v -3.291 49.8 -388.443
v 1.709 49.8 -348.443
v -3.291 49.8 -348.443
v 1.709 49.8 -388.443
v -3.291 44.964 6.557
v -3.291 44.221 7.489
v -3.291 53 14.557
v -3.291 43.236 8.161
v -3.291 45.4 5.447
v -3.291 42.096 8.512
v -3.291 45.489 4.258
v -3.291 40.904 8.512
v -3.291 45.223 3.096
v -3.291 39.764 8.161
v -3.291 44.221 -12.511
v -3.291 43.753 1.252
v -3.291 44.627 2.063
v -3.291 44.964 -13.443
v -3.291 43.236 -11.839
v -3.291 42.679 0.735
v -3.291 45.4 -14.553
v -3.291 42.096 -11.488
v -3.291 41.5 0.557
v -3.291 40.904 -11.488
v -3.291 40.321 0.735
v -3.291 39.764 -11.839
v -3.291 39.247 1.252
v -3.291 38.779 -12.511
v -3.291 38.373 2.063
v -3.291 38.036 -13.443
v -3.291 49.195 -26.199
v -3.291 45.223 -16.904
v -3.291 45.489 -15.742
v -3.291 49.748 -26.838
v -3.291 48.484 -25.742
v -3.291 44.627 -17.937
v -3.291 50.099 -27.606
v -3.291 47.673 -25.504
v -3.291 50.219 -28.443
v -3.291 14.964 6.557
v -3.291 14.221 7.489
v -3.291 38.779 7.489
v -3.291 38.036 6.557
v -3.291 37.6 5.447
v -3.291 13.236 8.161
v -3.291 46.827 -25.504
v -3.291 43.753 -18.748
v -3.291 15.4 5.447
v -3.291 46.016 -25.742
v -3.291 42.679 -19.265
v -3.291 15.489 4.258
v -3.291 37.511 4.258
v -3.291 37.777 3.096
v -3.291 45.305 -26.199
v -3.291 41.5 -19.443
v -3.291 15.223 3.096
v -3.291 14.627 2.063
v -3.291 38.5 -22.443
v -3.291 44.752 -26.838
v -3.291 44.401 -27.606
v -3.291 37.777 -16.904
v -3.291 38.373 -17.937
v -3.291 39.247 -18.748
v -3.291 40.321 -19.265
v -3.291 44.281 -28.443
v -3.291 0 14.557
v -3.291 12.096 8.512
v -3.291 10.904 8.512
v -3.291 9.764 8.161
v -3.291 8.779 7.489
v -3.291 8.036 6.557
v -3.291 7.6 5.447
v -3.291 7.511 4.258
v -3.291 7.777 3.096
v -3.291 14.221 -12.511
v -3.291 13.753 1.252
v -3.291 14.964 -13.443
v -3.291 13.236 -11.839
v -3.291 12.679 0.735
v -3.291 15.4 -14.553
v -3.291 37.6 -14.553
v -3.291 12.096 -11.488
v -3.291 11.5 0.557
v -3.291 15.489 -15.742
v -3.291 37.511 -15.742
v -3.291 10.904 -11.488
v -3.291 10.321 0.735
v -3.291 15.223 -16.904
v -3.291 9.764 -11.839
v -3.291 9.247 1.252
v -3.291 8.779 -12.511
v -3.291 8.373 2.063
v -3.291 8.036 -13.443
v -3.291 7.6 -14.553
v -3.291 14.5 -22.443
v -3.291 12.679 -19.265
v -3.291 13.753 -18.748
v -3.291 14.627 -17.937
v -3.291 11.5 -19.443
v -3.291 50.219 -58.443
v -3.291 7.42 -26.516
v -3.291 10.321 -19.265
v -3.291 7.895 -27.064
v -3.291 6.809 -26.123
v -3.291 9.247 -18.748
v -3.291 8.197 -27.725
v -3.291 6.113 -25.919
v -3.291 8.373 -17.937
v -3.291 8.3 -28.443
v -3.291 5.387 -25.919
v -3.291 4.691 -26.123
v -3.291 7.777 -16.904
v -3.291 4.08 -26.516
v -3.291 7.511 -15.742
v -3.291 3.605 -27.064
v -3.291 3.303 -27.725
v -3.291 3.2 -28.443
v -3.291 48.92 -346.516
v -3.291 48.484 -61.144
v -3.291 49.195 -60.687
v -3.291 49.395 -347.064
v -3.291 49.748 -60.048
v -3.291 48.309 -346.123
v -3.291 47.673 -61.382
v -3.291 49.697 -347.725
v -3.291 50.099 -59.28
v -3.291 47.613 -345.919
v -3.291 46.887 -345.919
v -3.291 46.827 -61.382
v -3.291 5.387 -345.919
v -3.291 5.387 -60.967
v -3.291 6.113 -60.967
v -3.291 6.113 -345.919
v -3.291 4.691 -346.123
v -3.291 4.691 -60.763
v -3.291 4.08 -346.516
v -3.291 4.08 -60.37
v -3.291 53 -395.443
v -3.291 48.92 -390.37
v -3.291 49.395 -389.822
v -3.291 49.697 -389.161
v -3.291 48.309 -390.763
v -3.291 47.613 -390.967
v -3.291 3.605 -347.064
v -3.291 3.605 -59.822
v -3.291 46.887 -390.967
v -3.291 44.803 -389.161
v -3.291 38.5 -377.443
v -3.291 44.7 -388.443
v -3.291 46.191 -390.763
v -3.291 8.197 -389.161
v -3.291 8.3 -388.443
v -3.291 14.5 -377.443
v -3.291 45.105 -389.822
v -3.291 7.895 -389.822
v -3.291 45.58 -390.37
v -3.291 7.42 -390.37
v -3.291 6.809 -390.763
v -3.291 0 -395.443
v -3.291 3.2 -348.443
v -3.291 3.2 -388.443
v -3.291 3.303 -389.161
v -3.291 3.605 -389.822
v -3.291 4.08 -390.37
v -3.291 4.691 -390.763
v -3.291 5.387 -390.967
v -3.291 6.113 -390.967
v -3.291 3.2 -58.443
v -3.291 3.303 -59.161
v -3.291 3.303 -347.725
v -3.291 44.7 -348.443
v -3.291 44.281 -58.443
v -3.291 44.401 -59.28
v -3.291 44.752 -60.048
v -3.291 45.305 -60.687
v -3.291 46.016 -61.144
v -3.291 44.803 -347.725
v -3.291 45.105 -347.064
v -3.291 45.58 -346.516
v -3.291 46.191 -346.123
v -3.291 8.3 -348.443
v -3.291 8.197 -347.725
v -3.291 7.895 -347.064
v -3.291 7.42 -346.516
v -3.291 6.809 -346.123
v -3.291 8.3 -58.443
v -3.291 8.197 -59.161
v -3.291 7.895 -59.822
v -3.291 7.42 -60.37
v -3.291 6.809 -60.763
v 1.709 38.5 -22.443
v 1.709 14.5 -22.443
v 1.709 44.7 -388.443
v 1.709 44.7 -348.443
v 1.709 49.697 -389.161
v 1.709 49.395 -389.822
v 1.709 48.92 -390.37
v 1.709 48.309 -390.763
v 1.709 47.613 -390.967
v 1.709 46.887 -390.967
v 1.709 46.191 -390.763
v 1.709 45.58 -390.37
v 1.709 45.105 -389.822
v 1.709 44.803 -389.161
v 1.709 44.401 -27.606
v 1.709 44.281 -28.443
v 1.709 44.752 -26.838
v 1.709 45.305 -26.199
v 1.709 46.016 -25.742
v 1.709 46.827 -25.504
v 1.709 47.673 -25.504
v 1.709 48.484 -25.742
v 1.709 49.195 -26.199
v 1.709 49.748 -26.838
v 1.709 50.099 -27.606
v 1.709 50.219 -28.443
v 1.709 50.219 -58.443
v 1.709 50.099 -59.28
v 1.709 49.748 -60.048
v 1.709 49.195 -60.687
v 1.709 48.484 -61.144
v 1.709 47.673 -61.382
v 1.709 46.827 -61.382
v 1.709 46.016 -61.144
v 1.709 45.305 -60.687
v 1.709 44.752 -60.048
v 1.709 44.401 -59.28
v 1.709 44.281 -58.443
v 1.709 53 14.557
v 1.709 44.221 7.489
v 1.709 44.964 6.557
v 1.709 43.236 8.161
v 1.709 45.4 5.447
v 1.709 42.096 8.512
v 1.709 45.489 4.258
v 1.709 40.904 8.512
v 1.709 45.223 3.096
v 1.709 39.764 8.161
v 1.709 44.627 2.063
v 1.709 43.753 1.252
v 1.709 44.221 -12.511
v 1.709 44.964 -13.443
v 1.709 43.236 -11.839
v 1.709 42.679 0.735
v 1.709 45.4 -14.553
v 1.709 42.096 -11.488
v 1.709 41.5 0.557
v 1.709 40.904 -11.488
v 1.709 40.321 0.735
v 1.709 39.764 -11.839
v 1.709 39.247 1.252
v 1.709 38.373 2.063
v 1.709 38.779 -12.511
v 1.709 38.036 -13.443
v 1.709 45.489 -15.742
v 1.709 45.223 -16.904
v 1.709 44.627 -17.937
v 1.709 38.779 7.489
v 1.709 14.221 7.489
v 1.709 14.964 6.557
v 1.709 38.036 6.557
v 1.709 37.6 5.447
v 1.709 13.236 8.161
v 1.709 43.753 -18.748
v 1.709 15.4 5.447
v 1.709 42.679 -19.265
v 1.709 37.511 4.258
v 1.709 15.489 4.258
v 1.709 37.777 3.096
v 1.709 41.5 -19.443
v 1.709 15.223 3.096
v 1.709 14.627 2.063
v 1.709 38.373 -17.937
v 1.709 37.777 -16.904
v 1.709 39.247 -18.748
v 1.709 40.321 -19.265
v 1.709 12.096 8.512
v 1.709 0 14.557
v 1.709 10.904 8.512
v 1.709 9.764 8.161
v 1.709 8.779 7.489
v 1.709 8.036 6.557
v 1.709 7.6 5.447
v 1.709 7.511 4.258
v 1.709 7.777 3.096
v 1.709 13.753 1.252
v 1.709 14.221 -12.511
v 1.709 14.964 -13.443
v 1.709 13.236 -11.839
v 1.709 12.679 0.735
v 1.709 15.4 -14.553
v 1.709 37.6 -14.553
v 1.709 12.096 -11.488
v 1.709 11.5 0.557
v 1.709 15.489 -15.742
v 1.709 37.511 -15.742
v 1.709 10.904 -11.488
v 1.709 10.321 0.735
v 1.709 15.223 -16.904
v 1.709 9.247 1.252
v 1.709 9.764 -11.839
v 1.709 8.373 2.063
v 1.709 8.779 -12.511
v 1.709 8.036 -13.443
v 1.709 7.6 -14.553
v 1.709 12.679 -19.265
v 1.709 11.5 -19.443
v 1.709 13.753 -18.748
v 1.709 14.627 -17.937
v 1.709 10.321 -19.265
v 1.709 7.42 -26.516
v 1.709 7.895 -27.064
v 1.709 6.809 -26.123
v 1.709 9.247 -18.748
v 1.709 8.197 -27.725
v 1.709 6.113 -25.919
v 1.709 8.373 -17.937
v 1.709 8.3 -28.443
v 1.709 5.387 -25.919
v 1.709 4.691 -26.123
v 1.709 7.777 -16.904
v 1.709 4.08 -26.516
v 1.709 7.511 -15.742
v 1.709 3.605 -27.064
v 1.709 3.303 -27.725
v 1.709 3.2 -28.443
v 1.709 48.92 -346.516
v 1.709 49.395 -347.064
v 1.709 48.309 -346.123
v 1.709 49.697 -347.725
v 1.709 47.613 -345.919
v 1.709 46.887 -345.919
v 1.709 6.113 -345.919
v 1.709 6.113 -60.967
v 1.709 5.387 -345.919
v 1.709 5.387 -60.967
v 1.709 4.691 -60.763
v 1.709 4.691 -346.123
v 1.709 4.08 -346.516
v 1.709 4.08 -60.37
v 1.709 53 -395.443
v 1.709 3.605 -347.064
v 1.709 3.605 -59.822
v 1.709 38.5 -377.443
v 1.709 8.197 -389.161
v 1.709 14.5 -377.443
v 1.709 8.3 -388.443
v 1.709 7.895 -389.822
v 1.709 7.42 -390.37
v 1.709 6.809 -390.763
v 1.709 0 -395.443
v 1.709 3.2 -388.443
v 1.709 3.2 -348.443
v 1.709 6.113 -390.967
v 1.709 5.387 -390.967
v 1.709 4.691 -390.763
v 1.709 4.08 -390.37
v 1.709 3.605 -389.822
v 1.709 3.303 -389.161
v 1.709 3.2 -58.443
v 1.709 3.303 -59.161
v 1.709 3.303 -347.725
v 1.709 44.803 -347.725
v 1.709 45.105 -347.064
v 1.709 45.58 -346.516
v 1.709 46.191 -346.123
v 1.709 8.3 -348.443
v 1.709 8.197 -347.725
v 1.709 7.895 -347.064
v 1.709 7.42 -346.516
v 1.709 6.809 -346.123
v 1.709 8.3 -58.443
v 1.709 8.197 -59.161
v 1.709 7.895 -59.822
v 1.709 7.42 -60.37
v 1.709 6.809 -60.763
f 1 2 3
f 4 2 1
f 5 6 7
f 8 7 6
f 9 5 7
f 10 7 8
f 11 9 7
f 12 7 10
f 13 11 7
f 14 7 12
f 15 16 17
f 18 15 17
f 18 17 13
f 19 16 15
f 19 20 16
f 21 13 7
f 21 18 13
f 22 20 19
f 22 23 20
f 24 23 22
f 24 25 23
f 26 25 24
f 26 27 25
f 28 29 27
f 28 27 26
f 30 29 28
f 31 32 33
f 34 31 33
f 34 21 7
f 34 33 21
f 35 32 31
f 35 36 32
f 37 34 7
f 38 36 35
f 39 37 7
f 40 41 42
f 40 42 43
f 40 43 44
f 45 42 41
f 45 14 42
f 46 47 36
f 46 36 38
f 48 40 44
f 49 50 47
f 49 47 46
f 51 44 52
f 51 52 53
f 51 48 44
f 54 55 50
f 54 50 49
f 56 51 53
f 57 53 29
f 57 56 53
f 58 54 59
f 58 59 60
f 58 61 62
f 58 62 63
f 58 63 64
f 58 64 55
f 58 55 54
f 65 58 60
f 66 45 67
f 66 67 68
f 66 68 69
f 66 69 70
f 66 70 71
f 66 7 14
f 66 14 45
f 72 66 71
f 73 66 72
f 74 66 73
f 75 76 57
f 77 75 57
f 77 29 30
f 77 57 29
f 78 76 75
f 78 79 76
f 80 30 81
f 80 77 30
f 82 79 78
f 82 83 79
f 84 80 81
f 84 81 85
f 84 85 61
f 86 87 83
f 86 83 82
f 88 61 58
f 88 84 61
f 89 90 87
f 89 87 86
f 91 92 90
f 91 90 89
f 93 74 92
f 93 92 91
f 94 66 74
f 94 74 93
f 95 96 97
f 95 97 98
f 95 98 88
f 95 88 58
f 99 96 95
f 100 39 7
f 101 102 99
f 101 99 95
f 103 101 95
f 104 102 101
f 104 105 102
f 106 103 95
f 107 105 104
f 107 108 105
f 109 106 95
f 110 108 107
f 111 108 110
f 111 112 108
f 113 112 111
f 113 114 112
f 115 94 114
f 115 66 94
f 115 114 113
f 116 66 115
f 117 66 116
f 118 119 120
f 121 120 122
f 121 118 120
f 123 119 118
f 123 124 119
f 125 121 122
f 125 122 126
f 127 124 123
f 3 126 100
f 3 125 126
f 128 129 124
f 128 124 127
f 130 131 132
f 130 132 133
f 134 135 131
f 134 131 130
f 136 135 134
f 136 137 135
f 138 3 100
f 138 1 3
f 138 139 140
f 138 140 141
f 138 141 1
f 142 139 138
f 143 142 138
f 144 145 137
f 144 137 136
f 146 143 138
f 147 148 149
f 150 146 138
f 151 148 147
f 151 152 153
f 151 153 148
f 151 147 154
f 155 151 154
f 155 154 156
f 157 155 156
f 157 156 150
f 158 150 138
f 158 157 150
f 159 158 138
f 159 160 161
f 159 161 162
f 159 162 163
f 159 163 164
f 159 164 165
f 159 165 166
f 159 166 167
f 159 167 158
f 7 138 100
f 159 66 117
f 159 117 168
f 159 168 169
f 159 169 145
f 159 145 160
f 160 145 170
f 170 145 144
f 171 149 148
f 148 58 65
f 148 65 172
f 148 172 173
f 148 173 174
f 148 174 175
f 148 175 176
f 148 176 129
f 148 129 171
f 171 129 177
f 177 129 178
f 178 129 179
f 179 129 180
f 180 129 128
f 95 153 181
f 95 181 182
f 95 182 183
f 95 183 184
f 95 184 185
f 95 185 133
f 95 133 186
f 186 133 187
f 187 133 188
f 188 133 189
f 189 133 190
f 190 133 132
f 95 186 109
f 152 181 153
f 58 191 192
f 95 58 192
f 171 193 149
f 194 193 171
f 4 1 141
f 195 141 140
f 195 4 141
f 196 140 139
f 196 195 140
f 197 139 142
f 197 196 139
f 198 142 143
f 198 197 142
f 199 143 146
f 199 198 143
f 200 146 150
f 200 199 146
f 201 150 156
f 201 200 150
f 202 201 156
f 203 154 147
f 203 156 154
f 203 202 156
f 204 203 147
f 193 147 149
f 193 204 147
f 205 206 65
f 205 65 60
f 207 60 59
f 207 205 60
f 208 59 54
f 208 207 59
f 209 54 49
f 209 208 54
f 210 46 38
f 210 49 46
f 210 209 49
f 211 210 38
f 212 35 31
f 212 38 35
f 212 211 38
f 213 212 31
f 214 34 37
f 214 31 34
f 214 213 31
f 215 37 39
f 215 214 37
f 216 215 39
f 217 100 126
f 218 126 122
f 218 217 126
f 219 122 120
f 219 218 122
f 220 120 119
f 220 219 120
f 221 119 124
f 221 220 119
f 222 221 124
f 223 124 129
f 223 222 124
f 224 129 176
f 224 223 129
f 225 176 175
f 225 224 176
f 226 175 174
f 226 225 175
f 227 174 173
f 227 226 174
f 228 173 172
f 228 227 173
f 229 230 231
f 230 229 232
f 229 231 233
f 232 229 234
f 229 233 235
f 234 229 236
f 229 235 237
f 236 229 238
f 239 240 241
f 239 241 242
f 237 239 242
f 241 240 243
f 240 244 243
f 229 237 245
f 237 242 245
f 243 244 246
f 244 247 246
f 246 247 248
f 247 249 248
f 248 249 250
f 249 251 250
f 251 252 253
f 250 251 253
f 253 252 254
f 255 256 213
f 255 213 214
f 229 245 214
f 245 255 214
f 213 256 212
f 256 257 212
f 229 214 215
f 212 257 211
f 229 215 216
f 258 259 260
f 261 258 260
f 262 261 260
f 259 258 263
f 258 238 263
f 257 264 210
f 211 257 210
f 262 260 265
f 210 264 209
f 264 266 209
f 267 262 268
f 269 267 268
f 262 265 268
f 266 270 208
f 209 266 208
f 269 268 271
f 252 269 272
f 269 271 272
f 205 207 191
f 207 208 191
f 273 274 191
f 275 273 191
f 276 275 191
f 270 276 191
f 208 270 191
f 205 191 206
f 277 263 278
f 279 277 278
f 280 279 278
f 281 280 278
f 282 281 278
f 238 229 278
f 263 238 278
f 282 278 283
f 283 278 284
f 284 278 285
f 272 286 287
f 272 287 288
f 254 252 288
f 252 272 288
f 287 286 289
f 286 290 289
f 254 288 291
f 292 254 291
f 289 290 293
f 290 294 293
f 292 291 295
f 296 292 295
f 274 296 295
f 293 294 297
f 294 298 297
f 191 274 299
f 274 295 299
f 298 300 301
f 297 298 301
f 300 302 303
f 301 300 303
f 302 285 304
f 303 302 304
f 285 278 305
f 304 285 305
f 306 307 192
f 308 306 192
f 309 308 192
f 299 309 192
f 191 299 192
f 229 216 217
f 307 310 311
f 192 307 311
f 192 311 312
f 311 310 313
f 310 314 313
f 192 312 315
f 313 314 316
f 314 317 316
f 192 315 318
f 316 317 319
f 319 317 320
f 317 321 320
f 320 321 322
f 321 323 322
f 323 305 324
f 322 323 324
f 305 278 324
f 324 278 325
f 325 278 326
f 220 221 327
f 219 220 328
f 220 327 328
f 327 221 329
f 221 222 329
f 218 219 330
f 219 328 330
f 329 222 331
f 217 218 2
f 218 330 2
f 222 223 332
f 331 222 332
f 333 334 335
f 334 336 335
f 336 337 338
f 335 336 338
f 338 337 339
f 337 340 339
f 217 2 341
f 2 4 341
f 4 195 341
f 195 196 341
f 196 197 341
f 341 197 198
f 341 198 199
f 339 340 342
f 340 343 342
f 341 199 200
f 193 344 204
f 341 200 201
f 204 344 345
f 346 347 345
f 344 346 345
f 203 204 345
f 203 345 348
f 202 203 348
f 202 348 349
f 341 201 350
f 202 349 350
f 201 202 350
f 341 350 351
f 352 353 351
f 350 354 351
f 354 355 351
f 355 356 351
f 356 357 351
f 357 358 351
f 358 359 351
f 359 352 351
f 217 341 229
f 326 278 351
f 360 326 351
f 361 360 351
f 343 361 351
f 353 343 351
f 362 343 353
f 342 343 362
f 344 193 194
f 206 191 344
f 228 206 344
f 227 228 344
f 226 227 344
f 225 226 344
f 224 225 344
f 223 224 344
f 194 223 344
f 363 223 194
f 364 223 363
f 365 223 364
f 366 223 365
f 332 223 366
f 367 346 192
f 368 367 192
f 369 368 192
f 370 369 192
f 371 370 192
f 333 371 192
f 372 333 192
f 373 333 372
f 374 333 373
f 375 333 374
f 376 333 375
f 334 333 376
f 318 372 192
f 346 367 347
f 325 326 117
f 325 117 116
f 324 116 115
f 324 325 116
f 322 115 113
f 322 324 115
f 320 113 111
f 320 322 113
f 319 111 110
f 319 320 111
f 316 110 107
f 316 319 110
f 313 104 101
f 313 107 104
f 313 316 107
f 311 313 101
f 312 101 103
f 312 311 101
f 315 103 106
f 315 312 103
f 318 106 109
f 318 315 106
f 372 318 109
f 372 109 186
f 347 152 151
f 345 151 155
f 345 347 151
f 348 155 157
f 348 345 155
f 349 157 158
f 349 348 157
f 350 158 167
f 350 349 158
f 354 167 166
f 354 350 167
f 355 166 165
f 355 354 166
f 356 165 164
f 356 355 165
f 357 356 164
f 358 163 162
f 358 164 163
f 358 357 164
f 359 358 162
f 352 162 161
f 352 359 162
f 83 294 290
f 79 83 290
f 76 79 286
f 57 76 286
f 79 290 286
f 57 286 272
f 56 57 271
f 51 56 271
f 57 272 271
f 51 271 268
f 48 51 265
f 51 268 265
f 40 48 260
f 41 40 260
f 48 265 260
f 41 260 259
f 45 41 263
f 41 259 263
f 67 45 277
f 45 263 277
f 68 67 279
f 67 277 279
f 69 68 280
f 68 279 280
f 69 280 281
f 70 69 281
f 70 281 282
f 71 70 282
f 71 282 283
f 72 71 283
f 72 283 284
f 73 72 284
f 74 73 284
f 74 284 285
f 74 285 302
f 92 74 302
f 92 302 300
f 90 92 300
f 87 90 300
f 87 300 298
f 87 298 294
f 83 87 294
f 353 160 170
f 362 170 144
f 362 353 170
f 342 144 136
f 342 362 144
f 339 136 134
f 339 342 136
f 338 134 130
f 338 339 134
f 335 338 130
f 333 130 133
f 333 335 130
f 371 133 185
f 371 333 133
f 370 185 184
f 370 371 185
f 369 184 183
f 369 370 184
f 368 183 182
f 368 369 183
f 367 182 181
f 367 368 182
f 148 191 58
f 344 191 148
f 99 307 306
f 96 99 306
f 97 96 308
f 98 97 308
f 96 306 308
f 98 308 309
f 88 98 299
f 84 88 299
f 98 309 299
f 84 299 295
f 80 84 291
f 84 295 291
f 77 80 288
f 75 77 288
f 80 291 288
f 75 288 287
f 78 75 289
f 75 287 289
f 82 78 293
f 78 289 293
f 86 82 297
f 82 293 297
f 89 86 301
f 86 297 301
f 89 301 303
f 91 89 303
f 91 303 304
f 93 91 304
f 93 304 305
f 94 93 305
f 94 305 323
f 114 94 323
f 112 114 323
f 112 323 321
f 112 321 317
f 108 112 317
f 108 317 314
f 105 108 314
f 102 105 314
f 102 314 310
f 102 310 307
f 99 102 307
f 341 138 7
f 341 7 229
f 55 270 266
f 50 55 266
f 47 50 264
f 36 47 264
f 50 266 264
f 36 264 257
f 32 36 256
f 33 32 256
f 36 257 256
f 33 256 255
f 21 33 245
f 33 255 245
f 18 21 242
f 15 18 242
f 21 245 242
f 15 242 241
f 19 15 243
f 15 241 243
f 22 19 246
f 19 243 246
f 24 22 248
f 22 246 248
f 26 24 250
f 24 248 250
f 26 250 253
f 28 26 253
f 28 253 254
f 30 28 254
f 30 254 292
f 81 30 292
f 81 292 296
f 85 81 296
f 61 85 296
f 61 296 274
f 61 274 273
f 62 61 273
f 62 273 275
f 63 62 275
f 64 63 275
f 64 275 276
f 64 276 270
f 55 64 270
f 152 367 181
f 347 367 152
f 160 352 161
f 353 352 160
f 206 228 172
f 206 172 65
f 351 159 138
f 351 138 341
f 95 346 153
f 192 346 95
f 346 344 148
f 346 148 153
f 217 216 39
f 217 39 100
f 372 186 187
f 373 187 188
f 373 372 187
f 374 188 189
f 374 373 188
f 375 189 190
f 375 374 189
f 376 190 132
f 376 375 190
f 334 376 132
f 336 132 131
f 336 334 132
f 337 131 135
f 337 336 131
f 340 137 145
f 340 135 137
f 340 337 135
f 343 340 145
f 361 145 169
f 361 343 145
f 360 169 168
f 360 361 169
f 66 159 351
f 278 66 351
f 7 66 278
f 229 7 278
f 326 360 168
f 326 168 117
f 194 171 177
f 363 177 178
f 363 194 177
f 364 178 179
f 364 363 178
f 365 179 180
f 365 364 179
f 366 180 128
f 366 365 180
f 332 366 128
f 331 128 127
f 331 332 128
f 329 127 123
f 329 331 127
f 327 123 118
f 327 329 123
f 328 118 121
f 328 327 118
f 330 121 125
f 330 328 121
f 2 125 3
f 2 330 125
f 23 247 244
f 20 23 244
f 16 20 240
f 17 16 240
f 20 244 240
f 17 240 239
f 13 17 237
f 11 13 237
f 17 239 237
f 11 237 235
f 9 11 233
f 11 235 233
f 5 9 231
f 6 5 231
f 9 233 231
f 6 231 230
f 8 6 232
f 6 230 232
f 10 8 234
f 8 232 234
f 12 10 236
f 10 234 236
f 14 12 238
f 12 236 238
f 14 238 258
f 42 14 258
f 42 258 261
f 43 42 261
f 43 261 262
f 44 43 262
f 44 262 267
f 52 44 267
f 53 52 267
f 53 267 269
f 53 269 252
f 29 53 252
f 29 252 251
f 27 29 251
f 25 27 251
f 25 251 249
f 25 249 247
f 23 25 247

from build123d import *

# Parameters (mm, degrees)
SKETCH_1_W          = 5
SKETCH_1_H          = 410
EXTRUDE_1_DEPTH     = 53
CUT_EXTRUDE_1_REACH = 401.01
CUT_EXTRUDE_2_REACH = 401.01
CUT_EXTRUDE_3_REACH = 401.01
SKETCH_4_R          = 4


with BuildPart() as part:
    # 草图1 → 凸台-拉伸1 (new body)
    with BuildSketch(Plane(origin=(0, 0, 0), x_dir=(1, 0, 0), z_dir=(0, 1, 0))):
        with Locations((-0.791139241, 190.443037975)):
            Rectangle(SKETCH_1_W, SKETCH_1_H)
    extrude(amount=EXTRUDE_1_DEPTH)

    # 草图2 → 切除-拉伸1 (cut, up to next)
    with BuildSketch(Plane(origin=(1.708860759, 0, 0), x_dir=(0, 0, -1), z_dir=(1, 0, 0)), mode=Mode.PRIVATE) as cut_extrude_1_sk1:
        with BuildLine():
            Line((58.443037975, 44.280521885), (28.443037975, 44.280521885))
            ThreePointArc((28.443037975, 44.280521885), (25.47355986, 47.25), (28.443037975, 50.219478115))
            Line((28.443037975, 50.219478115), (58.443037975, 50.219478115))
            ThreePointArc((58.443037975, 50.219478115), (61.41251609, 47.25), (58.443037975, 44.280521885))
        make_face()
    cut_extrude_1_tool1 = extrude(cut_extrude_1_sk1.sketch, amount=-CUT_EXTRUDE_1_REACH, mode=Mode.PRIVATE) & part.part
    # 草图2 → 切除-拉伸1 (cut, up to next)
    with BuildSketch(Plane(origin=(1.708860759, 0, 0), x_dir=(0, 0, -1), z_dir=(1, 0, 0)), mode=Mode.PRIVATE) as cut_extrude_1_sk2:
        with BuildLine():
            Line((58.443037975, 3.2), (28.443037975, 3.2))
            ThreePointArc((28.443037975, 3.2), (25.893037975, 5.75), (28.443037975, 8.3))
            Line((28.443037975, 8.3), (58.443037975, 8.3))
            ThreePointArc((58.443037975, 8.3), (60.993037975, 5.75), (58.443037975, 3.2))
        make_face()
    cut_extrude_1_tool2 = extrude(cut_extrude_1_sk2.sketch, amount=-CUT_EXTRUDE_1_REACH, mode=Mode.PRIVATE) & part.part
    # 草图2 → 切除-拉伸1 (cut, up to next)
    with BuildSketch(Plane(origin=(1.708860759, 0, 0), x_dir=(0, 0, -1), z_dir=(1, 0, 0)), mode=Mode.PRIVATE) as cut_extrude_1_sk3:
        with BuildLine():
            Line((348.443037975, 49.8), (388.443037975, 49.8))
            ThreePointArc((388.443037975, 49.8), (390.993037975, 47.25), (388.443037975, 44.7))
            Line((388.443037975, 44.7), (348.443037975, 44.7))
            ThreePointArc((348.443037975, 44.7), (345.893037975, 47.25), (348.443037975, 49.8))
        make_face()
    cut_extrude_1_tool3 = extrude(cut_extrude_1_sk3.sketch, amount=-CUT_EXTRUDE_1_REACH, mode=Mode.PRIVATE) & part.part
    # 草图2 → 切除-拉伸1 (cut, up to next)
    with BuildSketch(Plane(origin=(1.708860759, 0, 0), x_dir=(0, 0, -1), z_dir=(1, 0, 0)), mode=Mode.PRIVATE) as cut_extrude_1_sk4:
        with BuildLine():
            Line((348.443037975, 8.3), (388.443037975, 8.3))
            ThreePointArc((388.443037975, 8.3), (390.993037975, 5.75), (388.443037975, 3.2))
            Line((388.443037975, 3.2), (348.443037975, 3.2))
            ThreePointArc((348.443037975, 3.2), (345.893037975, 5.75), (348.443037975, 8.3))
        make_face()
    cut_extrude_1_tool4 = extrude(cut_extrude_1_sk4.sketch, amount=-CUT_EXTRUDE_1_REACH, mode=Mode.PRIVATE) & part.part
    add(cut_extrude_1_tool1.solids().sort_by_distance((1.708861, 47.25, -43.443038))[0], mode=Mode.SUBTRACT)
    add(cut_extrude_1_tool2.solids().sort_by_distance((1.708861, 5.75, -43.443038))[0], mode=Mode.SUBTRACT)
    add(cut_extrude_1_tool3.solids().sort_by_distance((1.708861, 47.25, -368.443038))[0], mode=Mode.SUBTRACT)
    add(cut_extrude_1_tool4.solids().sort_by_distance((1.708861, 5.75, -368.443038))[0], mode=Mode.SUBTRACT)

    # 草图3 → 切除-拉伸2 (cut, up to next)
    with BuildSketch(Plane(origin=(1.708860759, 0, 0), x_dir=(0, 0, -1), z_dir=(1, 0, 0)), mode=Mode.PRIVATE) as cut_extrude_2_sk1:
        Polygon((22.443037975, 26.5), (22.443037975, 38.5), (377.443037975, 38.5), (377.443037975, 14.5), (22.443037975, 14.5), align=None)
    cut_extrude_2_tool1 = extrude(cut_extrude_2_sk1.sketch, amount=-CUT_EXTRUDE_2_REACH, mode=Mode.PRIVATE) & part.part
    add(cut_extrude_2_tool1.solids().sort_by_distance((1.708861, 26.5, -199.943038))[0], mode=Mode.SUBTRACT)

    # 草图4 → 切除-拉伸3 (cut, up to next)
    with BuildSketch(Plane(origin=(1.708860759, 0, 0), x_dir=(0, 0, -1), z_dir=(1, 0, 0)), mode=Mode.PRIVATE) as cut_extrude_3_sk1:
        with Locations((-4.556962025, 41.5)):
            Circle(SKETCH_4_R)
    cut_extrude_3_tool1 = extrude(cut_extrude_3_sk1.sketch, amount=-CUT_EXTRUDE_3_REACH, mode=Mode.PRIVATE) & part.part
    # 草图4 → 切除-拉伸3 (cut, up to next)
    with BuildSketch(Plane(origin=(1.708860759, 0, 0), x_dir=(0, 0, -1), z_dir=(1, 0, 0)), mode=Mode.PRIVATE) as cut_extrude_3_sk2:
        with Locations((15.443037975, 41.5)):
            Circle(SKETCH_4_R)
    cut_extrude_3_tool2 = extrude(cut_extrude_3_sk2.sketch, amount=-CUT_EXTRUDE_3_REACH, mode=Mode.PRIVATE) & part.part
    # 草图4 → 切除-拉伸3 (cut, up to next)
    with BuildSketch(Plane(origin=(1.708860759, 0, 0), x_dir=(0, 0, -1), z_dir=(1, 0, 0)), mode=Mode.PRIVATE) as cut_extrude_3_sk3:
        with Locations((15.443037975, 11.5)):
            Circle(SKETCH_4_R)
    cut_extrude_3_tool3 = extrude(cut_extrude_3_sk3.sketch, amount=-CUT_EXTRUDE_3_REACH, mode=Mode.PRIVATE) & part.part
    # 草图4 → 切除-拉伸3 (cut, up to next)
    with BuildSketch(Plane(origin=(1.708860759, 0, 0), x_dir=(0, 0, -1), z_dir=(1, 0, 0)), mode=Mode.PRIVATE) as cut_extrude_3_sk4:
        with Locations((-4.556962025, 11.5)):
            Circle(SKETCH_4_R)
    cut_extrude_3_tool4 = extrude(cut_extrude_3_sk4.sketch, amount=-CUT_EXTRUDE_3_REACH, mode=Mode.PRIVATE) & part.part
    add(cut_extrude_3_tool1.solids().sort_by_distance((1.708861, 41.5, 4.556962))[0], mode=Mode.SUBTRACT)
    add(cut_extrude_3_tool2.solids().sort_by_distance((1.708861, 41.5, -15.443038))[0], mode=Mode.SUBTRACT)
    add(cut_extrude_3_tool3.solids().sort_by_distance((1.708861, 11.5, -15.443038))[0], mode=Mode.SUBTRACT)
    add(cut_extrude_3_tool4.solids().sort_by_distance((1.708861, 11.5, 4.556962))[0], mode=Mode.SUBTRACT)


solid = part.part
